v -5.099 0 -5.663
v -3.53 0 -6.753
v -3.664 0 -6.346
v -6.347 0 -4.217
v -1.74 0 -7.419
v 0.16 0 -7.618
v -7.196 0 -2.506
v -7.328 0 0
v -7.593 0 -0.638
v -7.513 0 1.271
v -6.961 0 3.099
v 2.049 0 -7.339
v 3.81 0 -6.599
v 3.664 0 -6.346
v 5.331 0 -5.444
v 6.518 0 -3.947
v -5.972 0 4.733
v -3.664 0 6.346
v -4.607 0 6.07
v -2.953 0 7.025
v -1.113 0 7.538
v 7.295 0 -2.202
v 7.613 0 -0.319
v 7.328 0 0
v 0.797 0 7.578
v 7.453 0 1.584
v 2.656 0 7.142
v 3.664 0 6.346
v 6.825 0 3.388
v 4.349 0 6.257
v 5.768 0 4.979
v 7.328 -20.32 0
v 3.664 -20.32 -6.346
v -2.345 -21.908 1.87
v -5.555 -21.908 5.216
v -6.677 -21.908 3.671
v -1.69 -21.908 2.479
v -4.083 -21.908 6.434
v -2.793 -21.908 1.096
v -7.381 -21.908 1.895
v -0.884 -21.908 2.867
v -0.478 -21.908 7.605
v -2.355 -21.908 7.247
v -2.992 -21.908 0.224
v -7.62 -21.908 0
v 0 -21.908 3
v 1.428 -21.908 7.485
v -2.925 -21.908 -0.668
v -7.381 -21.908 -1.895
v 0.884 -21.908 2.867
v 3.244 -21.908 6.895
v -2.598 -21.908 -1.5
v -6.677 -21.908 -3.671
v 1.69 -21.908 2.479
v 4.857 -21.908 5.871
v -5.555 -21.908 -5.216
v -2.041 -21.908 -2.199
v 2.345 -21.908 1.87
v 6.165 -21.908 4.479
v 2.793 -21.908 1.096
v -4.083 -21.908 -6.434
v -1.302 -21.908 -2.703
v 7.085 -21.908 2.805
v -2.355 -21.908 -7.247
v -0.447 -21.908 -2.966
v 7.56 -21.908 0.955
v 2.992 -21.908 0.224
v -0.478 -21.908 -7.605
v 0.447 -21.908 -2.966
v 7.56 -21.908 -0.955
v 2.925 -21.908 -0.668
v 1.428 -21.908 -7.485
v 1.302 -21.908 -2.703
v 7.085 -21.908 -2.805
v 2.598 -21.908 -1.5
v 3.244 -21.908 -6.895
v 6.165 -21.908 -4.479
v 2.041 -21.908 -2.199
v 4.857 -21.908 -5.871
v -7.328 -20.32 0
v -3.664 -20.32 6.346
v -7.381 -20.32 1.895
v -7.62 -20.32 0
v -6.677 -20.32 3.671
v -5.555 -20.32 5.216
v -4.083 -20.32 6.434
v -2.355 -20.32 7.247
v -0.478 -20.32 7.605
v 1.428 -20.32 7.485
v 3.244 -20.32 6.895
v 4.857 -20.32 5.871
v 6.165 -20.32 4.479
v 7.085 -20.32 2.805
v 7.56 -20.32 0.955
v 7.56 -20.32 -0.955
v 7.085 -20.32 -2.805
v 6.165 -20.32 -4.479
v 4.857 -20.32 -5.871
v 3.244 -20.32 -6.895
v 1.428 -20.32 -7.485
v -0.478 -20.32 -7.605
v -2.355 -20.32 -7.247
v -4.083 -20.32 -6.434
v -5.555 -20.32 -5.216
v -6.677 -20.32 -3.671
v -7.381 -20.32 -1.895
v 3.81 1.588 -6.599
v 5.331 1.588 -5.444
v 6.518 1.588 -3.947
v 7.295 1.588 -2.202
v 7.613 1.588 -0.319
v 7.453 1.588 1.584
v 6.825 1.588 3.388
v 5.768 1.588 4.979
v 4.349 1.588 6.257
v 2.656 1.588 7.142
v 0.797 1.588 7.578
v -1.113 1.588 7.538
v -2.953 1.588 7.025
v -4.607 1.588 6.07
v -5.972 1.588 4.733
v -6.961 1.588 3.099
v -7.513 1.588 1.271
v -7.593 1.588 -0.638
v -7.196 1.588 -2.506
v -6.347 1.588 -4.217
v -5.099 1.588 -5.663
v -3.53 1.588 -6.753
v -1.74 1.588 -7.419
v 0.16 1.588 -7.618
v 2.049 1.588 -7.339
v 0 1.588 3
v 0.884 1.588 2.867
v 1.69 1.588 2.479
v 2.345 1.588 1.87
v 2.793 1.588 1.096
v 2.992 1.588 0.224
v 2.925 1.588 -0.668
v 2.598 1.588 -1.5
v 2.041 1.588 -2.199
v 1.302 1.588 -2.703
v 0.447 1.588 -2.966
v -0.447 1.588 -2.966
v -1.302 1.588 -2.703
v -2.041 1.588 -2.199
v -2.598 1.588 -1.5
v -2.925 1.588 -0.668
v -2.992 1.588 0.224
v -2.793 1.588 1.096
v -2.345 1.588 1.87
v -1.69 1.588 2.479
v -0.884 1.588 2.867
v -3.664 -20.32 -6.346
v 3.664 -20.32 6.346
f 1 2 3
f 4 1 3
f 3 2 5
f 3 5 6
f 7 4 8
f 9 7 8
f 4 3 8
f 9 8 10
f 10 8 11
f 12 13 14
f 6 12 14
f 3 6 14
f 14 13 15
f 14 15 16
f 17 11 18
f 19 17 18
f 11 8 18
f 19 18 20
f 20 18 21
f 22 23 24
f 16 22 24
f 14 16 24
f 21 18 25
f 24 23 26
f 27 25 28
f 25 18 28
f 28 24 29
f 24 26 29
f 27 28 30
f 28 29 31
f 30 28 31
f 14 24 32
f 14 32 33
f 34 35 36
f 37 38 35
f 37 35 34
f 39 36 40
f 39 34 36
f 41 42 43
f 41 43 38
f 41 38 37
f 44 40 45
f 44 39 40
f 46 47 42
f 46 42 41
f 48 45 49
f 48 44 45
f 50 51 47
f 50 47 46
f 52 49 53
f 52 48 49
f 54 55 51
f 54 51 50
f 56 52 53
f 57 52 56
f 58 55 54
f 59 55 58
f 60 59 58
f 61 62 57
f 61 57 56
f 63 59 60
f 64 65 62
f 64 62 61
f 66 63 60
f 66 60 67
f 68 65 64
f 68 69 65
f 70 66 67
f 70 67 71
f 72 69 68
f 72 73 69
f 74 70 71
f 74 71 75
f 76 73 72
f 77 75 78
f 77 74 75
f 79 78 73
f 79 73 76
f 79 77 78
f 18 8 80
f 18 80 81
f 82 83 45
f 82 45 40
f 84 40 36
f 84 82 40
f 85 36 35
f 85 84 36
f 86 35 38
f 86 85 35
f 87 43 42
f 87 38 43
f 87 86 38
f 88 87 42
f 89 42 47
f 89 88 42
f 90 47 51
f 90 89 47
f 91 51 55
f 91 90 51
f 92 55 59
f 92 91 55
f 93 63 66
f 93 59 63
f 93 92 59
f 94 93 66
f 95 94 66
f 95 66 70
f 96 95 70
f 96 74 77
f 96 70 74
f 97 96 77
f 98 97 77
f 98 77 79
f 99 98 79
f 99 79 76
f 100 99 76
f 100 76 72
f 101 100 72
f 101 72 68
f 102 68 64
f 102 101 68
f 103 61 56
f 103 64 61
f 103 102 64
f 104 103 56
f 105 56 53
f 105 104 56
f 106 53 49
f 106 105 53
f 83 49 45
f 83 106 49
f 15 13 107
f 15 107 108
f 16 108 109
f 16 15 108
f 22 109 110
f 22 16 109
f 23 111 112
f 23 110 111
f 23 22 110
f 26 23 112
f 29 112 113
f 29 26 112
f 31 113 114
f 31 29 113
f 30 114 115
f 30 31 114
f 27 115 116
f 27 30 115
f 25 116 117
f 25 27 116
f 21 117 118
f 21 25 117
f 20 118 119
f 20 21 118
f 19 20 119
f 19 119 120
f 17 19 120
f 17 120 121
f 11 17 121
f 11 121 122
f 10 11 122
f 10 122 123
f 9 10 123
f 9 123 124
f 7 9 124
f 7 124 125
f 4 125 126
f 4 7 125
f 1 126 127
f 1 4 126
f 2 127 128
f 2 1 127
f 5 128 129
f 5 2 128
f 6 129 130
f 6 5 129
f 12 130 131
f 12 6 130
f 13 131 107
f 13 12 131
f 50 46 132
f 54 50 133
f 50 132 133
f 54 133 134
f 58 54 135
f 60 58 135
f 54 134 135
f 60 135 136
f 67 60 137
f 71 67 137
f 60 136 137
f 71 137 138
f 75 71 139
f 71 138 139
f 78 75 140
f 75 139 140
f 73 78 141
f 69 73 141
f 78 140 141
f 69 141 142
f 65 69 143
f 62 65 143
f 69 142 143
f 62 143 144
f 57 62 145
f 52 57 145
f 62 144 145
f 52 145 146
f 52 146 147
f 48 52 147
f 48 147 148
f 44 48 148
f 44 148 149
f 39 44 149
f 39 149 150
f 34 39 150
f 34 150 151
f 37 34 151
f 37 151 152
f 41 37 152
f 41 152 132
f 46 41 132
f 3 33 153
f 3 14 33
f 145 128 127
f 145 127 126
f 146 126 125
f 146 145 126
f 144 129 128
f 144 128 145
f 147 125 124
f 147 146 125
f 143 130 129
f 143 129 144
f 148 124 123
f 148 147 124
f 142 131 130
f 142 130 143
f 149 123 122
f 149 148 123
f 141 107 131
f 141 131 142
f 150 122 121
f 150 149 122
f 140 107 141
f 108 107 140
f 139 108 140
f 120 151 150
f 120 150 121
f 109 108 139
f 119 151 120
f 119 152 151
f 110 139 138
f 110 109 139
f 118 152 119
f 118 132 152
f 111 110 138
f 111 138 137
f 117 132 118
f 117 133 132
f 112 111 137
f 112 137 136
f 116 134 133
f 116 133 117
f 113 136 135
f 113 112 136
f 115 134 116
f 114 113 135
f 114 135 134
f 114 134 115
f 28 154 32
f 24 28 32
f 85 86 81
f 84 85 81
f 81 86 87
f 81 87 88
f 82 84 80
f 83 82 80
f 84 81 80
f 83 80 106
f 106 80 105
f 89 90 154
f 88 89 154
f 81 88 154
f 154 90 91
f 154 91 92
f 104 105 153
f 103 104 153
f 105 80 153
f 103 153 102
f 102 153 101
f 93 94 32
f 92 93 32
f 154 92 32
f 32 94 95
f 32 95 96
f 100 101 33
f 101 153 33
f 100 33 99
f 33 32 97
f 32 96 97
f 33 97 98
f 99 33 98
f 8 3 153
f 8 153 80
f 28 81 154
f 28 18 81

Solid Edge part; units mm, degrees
sketch "Sketch1" plane through (0, 0, 0) normal (0, -1, 0) x (1, 0, 0)
  line L0 (-3.6639, 6.3461) -> (3.6639, 6.3461)
  line L1 (3.6639, 6.3461) -> (7.3279, 0)
  line L2 (7.3279, 0) -> (3.6639, -6.3461)
  line L3 (3.6639, -6.3461) -> (-3.6639, -6.3461)
  line L4 (-3.6639, -6.3461) -> (-7.3279, 0)
  line L5 (-7.3279, 0) -> (-3.6639, 6.3461)
  dimension "D1" = 14.6558
extrude "Protrusion1" add sketch "Sketch1" along normal blind 20.32
sketch "Sketch2" plane through (0, 0, 0) normal (0, 1, 0) x (0.5, 0, -0.866)
  circle A0 centre (0, 0) radius 7.62
extrude "ExtrudedProtrusion_2" add sketch "Sketch2" along normal blind 1.5875
sketch "Sketch3" plane through (0, -20.32, 0) normal (0, -1, 0) x (-1, 0, 0)
  circle A0 centre (0, 0) radius 7.62
extrude "ExtrudedProtrusion_3" add sketch "Sketch3" along normal blind 1.5875
sketch "Sketch4" plane through (0, 1.5875, 0) normal (0, 1, 0) x (0, 0, 1)
  circle A0 centre (0, 0) radius 3
  dimension "D1" = 6
extrude "Cutout1" cut sketch "Sketch4" against normal up to next
